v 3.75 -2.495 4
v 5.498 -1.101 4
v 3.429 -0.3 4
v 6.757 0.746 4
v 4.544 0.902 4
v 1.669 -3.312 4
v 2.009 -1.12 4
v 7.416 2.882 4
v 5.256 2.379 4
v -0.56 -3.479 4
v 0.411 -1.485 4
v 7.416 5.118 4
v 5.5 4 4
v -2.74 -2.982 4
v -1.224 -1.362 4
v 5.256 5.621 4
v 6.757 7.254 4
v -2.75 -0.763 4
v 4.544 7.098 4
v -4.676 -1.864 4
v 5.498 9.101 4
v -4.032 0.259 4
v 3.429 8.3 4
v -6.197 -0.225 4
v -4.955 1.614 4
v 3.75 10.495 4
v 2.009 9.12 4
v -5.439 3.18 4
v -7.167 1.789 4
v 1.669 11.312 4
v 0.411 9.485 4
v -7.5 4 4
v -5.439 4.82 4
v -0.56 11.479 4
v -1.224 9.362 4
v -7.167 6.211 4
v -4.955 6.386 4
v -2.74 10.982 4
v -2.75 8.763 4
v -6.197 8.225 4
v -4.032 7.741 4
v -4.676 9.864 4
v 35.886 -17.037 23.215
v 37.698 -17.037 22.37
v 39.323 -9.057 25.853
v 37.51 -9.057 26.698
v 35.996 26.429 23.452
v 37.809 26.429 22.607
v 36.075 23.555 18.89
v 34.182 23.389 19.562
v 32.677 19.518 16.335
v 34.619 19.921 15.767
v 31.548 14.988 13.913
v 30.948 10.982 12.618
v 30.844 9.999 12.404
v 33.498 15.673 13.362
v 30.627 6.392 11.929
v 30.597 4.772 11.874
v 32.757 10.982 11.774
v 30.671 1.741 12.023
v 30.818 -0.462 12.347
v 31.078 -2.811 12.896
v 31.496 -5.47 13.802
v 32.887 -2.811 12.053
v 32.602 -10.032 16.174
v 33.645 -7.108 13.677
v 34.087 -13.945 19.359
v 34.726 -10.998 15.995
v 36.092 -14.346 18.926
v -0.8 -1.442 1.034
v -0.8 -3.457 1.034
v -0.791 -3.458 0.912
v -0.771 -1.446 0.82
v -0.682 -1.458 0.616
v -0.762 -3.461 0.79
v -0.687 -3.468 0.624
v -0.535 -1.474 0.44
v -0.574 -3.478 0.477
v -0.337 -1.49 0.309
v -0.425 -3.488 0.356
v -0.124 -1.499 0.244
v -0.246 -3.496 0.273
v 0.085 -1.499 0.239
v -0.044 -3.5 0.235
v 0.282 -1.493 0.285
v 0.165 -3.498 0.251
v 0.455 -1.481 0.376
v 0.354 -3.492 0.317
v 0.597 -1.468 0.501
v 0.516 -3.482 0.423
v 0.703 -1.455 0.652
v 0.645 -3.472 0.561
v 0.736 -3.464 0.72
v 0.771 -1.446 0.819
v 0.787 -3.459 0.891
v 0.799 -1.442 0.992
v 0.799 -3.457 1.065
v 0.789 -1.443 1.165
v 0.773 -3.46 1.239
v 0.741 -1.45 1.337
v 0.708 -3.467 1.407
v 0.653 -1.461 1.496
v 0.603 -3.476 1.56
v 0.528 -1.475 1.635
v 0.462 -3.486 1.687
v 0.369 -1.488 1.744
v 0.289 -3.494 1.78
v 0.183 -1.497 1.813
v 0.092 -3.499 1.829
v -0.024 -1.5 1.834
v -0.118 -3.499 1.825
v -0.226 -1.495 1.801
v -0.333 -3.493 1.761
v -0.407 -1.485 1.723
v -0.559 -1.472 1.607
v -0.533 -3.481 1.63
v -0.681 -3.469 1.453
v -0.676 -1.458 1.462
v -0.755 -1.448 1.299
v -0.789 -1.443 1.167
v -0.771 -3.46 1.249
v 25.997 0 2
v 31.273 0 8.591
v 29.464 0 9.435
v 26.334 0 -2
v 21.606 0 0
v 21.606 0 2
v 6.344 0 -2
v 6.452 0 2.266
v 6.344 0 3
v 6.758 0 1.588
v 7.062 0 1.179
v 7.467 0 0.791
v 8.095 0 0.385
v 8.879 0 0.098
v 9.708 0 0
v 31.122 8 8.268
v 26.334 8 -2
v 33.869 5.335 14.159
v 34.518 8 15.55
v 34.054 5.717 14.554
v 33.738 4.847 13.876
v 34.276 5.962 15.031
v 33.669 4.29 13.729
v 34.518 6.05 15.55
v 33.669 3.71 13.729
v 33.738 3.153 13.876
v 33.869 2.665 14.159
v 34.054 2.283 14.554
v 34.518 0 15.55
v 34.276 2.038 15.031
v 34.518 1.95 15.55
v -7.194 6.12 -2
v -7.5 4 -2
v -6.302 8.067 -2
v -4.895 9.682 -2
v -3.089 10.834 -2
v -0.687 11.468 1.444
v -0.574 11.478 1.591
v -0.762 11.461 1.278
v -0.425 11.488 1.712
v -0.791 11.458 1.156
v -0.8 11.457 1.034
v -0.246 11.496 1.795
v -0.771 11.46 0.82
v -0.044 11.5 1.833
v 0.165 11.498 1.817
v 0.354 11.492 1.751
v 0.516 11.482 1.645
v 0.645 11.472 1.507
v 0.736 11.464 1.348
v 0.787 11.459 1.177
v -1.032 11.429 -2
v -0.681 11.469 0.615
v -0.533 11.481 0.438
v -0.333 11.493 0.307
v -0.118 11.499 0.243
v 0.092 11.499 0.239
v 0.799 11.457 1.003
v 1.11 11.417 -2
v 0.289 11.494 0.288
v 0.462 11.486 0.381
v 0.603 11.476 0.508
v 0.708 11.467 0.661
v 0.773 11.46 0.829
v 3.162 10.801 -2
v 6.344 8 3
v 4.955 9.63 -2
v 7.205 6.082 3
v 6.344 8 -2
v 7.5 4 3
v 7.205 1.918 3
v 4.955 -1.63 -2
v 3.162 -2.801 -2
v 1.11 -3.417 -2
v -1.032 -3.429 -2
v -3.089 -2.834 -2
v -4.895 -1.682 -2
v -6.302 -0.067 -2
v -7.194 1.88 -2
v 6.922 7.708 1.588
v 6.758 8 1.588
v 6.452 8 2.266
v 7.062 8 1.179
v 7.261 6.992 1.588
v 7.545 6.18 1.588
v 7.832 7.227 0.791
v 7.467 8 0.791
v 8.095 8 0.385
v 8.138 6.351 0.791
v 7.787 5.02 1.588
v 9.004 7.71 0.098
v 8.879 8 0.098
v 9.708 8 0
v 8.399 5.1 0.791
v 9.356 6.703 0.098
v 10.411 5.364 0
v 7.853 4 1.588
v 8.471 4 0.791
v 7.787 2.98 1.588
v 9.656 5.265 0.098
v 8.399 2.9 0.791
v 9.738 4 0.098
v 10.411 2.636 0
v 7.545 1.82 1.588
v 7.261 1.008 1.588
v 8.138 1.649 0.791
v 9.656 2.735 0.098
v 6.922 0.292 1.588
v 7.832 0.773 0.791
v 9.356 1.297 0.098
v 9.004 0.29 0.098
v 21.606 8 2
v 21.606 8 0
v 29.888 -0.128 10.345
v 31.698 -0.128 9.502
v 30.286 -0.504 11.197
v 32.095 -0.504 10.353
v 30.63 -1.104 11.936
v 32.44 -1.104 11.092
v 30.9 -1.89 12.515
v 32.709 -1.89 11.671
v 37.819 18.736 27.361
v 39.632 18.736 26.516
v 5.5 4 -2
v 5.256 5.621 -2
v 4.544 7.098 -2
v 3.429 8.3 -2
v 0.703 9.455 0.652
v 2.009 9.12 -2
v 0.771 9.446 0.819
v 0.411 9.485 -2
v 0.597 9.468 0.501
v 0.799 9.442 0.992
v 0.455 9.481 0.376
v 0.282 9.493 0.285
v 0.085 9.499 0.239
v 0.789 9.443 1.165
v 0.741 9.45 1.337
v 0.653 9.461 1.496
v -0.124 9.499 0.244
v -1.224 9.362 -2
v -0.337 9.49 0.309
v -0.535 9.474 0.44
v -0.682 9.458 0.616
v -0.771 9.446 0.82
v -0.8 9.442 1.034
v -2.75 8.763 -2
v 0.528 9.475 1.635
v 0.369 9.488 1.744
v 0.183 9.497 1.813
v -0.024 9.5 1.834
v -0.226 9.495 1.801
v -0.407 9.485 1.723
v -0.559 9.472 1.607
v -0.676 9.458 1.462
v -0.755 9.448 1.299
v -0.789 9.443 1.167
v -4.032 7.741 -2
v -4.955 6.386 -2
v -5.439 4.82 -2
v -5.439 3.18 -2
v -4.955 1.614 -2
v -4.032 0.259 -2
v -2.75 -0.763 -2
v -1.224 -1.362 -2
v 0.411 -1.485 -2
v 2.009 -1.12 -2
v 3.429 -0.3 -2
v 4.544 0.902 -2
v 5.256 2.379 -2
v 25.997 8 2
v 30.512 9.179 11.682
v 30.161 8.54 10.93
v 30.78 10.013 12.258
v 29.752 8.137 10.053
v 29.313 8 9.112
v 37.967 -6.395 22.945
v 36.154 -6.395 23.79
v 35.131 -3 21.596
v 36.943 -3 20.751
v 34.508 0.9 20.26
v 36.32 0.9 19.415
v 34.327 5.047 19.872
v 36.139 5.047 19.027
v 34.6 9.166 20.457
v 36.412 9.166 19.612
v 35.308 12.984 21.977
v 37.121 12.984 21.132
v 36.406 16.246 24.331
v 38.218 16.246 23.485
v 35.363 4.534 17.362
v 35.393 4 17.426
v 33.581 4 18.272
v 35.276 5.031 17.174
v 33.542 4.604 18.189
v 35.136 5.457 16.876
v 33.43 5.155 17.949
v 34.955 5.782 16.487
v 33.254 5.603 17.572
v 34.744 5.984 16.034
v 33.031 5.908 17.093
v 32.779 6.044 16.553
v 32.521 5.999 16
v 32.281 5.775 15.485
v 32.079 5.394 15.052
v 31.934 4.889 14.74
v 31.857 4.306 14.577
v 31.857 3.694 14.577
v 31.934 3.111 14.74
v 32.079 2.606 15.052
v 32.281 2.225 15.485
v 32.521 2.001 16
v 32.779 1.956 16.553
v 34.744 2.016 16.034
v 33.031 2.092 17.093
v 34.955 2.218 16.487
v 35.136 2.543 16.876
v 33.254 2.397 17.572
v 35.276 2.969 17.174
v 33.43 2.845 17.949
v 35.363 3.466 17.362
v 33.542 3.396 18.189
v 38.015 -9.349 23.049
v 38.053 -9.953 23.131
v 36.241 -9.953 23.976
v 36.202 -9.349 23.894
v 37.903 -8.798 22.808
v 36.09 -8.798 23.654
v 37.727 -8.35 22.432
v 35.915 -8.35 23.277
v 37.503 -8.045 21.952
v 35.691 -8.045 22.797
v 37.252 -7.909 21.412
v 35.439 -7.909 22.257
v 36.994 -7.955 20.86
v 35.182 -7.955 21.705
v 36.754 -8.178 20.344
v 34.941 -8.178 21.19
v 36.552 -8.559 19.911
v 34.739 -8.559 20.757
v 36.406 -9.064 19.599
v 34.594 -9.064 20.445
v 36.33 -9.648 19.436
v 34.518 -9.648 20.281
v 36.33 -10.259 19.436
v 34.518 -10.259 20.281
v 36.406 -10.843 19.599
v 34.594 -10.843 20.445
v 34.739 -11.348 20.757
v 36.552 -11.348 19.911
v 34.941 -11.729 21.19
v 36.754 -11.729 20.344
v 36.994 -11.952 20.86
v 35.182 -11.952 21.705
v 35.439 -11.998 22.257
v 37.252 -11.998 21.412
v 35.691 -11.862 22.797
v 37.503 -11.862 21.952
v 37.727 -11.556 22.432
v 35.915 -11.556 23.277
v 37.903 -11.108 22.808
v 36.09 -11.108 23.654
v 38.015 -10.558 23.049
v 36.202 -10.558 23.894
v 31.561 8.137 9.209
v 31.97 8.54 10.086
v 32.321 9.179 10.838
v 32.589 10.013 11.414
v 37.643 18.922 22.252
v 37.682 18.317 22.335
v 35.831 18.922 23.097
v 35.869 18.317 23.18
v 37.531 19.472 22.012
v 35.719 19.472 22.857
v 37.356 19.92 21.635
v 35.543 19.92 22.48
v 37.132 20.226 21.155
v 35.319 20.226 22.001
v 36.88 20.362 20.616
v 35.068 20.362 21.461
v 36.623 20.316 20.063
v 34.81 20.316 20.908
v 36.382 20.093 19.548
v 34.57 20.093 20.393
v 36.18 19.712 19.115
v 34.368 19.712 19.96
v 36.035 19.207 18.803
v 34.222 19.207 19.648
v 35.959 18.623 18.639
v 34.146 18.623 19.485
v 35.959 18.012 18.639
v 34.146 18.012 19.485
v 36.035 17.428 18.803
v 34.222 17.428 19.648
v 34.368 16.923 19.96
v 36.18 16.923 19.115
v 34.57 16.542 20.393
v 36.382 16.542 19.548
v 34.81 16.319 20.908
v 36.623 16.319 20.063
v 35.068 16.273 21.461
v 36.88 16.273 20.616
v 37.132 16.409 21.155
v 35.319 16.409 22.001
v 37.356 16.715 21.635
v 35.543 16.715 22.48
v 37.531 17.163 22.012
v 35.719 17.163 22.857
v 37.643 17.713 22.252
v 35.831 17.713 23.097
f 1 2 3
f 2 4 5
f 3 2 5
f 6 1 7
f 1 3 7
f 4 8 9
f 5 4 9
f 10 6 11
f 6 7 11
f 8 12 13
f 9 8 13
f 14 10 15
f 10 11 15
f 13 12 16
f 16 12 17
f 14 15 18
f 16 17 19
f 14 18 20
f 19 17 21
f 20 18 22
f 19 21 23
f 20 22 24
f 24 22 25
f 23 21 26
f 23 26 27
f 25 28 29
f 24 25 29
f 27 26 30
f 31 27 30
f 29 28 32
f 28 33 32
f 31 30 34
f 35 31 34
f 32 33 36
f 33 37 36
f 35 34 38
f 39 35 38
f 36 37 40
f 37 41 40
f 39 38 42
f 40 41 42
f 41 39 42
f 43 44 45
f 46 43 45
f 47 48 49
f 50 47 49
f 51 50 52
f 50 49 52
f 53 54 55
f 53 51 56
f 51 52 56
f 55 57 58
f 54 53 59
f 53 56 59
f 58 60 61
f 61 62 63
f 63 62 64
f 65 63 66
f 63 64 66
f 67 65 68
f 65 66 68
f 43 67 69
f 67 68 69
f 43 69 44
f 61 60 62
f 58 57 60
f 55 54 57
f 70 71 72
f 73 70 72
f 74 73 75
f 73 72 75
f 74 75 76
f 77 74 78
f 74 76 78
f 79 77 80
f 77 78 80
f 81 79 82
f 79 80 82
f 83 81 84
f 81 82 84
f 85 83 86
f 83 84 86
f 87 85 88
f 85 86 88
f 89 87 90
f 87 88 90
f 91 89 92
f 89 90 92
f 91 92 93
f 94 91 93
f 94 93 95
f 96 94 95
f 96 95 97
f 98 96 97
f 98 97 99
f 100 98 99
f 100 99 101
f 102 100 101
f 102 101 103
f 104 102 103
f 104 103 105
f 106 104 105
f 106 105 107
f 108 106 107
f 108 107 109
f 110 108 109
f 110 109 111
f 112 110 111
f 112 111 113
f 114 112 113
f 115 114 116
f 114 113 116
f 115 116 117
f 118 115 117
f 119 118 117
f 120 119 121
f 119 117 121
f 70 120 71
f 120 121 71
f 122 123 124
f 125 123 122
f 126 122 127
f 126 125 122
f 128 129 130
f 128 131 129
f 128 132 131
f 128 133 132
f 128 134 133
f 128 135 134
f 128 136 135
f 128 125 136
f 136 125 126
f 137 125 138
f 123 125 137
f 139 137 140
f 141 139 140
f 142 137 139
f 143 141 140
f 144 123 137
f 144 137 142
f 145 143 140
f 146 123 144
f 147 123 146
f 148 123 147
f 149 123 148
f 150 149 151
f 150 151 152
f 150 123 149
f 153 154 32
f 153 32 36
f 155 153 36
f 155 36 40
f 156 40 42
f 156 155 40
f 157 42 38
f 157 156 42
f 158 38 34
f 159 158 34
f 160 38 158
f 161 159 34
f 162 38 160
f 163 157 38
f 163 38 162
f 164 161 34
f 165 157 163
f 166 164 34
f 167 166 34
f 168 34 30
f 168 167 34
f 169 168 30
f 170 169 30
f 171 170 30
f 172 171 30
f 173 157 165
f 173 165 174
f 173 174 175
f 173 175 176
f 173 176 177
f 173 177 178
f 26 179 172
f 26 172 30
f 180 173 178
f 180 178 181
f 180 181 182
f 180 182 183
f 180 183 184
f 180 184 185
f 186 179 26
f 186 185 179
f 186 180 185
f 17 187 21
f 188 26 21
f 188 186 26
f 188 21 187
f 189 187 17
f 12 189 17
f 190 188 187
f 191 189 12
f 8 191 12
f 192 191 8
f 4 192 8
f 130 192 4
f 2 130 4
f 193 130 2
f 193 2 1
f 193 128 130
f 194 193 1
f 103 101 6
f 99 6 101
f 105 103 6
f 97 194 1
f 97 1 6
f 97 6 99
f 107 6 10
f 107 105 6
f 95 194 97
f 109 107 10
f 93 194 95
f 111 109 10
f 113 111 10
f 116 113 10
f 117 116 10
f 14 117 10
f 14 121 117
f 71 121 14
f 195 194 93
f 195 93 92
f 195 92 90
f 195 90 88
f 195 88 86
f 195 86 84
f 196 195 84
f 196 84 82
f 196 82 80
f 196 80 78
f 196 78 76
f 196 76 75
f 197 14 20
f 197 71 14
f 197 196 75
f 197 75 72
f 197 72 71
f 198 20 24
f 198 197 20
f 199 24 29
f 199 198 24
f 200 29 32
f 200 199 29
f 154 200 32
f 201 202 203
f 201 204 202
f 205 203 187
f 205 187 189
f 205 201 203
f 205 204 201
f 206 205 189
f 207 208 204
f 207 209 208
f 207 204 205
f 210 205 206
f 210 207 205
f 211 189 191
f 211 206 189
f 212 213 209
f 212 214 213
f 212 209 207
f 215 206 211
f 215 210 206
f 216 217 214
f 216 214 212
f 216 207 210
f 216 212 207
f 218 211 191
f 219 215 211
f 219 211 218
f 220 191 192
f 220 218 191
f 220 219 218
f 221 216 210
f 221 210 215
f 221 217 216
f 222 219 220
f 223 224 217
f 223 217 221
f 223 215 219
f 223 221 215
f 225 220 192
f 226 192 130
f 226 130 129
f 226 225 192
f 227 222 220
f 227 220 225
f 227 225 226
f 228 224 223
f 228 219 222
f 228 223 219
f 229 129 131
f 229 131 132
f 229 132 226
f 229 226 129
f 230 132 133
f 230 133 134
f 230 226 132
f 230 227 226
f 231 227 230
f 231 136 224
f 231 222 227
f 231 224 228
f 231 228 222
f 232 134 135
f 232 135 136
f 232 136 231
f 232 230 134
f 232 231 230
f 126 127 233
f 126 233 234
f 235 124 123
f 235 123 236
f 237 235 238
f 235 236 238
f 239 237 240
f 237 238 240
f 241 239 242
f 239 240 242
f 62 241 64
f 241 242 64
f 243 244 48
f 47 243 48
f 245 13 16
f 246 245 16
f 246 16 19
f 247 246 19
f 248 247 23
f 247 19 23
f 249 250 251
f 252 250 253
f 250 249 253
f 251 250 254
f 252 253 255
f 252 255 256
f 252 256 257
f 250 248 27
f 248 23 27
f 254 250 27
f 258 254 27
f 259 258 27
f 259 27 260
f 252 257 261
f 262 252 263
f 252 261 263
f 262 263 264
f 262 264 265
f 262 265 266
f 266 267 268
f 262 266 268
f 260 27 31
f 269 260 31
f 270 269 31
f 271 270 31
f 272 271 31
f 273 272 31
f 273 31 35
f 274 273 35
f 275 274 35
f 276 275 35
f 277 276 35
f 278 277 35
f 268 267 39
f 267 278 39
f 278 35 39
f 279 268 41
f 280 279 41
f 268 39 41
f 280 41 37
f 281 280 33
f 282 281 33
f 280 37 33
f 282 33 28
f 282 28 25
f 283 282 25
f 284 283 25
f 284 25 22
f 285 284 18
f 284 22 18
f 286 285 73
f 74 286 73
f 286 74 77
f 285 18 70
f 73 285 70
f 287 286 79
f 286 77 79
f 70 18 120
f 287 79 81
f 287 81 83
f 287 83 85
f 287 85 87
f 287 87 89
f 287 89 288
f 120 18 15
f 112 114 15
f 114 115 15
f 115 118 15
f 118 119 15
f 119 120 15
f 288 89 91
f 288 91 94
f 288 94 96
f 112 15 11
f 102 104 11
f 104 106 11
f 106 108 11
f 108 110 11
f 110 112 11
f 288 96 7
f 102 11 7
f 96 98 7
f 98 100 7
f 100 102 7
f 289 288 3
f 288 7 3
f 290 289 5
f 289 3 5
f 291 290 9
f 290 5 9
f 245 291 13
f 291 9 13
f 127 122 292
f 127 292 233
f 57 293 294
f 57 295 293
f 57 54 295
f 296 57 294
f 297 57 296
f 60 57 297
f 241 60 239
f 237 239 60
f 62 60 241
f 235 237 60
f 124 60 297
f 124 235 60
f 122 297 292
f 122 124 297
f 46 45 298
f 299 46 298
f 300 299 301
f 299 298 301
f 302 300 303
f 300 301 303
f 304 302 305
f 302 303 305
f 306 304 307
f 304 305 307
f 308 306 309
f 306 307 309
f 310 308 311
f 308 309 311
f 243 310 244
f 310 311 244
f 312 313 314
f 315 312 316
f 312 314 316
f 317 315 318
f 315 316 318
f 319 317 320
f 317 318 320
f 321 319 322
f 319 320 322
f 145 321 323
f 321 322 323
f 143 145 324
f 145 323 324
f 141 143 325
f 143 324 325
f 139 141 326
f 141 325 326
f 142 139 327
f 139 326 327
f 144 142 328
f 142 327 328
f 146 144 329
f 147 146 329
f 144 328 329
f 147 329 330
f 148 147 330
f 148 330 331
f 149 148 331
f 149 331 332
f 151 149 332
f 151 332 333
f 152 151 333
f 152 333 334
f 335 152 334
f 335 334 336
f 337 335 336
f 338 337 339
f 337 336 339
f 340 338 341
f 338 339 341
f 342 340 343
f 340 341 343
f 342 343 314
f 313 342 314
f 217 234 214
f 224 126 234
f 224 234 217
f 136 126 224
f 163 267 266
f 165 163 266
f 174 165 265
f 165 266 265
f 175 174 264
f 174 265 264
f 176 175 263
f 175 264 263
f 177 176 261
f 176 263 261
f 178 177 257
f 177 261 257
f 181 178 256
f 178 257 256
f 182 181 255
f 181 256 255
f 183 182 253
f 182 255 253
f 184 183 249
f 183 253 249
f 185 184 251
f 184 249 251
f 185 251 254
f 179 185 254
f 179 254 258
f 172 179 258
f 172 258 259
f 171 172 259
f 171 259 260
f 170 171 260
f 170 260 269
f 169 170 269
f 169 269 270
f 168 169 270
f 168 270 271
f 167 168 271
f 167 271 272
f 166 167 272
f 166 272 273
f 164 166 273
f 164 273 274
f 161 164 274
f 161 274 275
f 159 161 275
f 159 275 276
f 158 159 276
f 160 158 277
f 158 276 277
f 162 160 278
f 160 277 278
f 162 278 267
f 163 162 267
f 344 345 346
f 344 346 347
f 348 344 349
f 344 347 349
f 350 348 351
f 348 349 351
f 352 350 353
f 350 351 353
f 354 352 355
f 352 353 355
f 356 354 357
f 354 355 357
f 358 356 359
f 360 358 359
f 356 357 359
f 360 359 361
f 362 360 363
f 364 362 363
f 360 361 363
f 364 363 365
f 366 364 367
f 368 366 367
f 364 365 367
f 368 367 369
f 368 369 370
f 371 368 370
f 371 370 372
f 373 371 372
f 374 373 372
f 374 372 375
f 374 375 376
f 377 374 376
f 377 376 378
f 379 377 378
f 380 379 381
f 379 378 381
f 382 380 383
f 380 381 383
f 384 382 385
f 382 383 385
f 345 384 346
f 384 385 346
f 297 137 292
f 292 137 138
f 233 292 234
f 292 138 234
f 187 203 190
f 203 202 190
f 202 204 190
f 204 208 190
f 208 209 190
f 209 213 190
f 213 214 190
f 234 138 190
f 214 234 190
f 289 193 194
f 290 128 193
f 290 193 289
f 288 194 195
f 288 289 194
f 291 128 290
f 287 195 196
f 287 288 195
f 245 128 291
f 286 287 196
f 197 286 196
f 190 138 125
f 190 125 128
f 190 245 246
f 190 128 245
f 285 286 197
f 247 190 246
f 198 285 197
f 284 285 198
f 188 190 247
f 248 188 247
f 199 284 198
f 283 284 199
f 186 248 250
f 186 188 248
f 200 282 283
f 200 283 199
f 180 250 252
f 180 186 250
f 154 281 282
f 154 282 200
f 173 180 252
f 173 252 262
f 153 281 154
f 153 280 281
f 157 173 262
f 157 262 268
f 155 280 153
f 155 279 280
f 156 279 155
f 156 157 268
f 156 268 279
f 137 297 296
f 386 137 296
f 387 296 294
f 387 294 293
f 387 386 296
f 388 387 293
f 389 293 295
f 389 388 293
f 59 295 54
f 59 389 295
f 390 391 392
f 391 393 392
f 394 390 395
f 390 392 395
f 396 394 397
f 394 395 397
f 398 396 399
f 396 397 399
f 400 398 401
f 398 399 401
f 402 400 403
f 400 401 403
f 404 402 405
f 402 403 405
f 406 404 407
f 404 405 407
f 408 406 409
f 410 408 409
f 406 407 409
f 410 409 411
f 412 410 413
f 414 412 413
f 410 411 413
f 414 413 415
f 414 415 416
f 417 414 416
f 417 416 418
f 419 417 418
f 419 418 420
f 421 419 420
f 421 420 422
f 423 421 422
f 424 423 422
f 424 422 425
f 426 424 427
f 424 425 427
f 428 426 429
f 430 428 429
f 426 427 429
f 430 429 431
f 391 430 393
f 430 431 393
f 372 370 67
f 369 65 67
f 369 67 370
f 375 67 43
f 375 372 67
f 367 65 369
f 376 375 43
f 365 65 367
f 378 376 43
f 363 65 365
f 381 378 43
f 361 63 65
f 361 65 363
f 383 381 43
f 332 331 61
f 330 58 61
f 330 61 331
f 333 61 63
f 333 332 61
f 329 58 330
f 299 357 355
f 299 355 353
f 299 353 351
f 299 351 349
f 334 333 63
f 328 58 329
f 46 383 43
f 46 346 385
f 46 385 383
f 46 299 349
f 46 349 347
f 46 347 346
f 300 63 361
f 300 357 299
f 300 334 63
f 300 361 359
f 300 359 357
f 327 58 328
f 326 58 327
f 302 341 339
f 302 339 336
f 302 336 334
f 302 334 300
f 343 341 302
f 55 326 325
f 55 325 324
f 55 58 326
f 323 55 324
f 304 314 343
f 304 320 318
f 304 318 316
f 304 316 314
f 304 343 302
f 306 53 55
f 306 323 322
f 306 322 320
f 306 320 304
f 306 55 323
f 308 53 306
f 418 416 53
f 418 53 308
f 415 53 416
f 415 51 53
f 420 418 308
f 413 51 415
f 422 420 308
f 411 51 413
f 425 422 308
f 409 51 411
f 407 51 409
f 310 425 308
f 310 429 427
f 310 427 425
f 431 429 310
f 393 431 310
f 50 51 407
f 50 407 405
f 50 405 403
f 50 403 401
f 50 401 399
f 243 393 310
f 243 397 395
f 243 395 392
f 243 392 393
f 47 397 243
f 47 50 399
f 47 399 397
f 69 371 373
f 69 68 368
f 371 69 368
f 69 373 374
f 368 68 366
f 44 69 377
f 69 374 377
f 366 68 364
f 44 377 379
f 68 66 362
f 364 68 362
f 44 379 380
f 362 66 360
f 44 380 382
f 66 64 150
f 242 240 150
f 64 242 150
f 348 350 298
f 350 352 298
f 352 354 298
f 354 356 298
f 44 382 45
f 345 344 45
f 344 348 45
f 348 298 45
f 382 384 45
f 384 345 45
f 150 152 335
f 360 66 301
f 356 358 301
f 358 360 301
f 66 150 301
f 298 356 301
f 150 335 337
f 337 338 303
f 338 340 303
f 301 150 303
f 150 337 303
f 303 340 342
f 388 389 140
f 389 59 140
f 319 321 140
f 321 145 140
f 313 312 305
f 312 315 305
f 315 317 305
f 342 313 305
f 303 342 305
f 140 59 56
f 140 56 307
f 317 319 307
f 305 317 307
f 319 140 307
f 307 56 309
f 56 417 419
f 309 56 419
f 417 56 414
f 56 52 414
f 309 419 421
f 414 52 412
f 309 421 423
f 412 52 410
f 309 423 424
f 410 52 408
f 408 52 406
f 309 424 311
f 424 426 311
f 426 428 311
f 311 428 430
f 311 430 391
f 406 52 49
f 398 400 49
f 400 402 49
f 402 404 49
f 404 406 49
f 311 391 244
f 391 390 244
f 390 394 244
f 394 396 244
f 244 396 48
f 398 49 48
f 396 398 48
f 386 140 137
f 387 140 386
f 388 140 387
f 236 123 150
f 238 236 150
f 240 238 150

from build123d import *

# Parameters (mm, degrees)
BOSS_EXTRUDE1_DEPTH     = 8
BOSS_EXTRUDE2_DEPTH     = 2
SKETCH3_R               = 2.05
CUT_EXTRUDE3_DEPTH      = 10
CUT_EXTRUDE3_DEPTH_BACK = 10
FILLET2_R               = 4
SKETCH6_R               = 7.5
BOSS_EXTRUDE3_DEPTH     = 6
SKETCH2_R               = 5.5
CUT_EXTRUDE4_DEPTH      = 28.361360249
CUT_EXTRUDE4_DEPTH_BACK = 3
SKETCH8_R               = 0.8
CUT_EXTRUDE5_DEPTH      = 30.928860828
FILLET3_R               = 3


with BuildPart() as part:
    # Sketch1 → Boss-Extrude1 (new body)
    with BuildSketch(Plane(origin=(0, 0, 0), x_dir=(1, 0, 0), z_dir=(0, 1, 0))):
        Polygon((0, 0), (0, 2), (26.334414729, 2), (34.518104392, -15.549979118), (32.760161227, -16.503727422), (25.996962058, -2), (21.605779457, -2), (21.605779457, 0), align=None)
    extrude(amount=BOSS_EXTRUDE1_DEPTH)

    # Sketch5 → Boss-Extrude2 (add)
    with BuildSketch(Plane(origin=(22.396969556, 0, -10.443878423), x_dir=(-0.422618262, 0, -0.906307787), z_dir=(0.906307787, 0, -0.422618262))):
        with BuildLine():
            Line((-40.780850255, 18.736062391), (-36.467218683, 26.428860828))
            ThreePointArc((-36.467218683, 26.428860828), (-23.692308478, 4.771999965), (-36.205658542, -17.037035395))
            Line((-36.205658542, -17.037035395), (-40.049339329, -9.057253488))
            ThreePointArc((-40.049339329, -9.057253488), (-32.517126315, 5.047276383), (-40.780850255, 18.736062391))
        make_face()
    extrude(amount=-BOSS_EXTRUDE2_DEPTH)

    # Sketch3 → Cut-Extrude3 (cut, two sides)
    with BuildSketch(Plane(origin=(20.587699136, 0, -9.600201771), x_dir=(0.422618262, 0, 0.906307787), z_dir=(-0.906307787, 0, 0.422618262))) as cut_extrude3_sk:
        with Locations((28.701516689, 4)):
            Circle(SKETCH3_R)
        with Locations((34.117040182, 18.317355913)):
            Circle(SKETCH3_R)
        with Locations((48.070293023, 24.611901983)):
            Circle(SKETCH3_R)
        with Locations((62.387648936, 19.19637849)):
            Circle(SKETCH3_R)
        with Locations((68.682195005, 5.243125649)):
            Circle(SKETCH3_R)
        with Locations((63.266671512, -9.074230264)):
            Circle(SKETCH3_R)
        with Locations((49.313418672, -15.368776333)):
            Circle(SKETCH3_R)
        with Locations((34.996062759, -9.953252841)):
            Circle(SKETCH3_R)
    extrude(amount=CUT_EXTRUDE3_DEPTH, mode=Mode.SUBTRACT)
    extrude(cut_extrude3_sk.sketch, amount=-CUT_EXTRUDE3_DEPTH_BACK, mode=Mode.SUBTRACT)

    # Fillet2
    fillet2_edges = [part.edges().sort_by_distance(p)[0] for p in [
        (31.687047343, 0, 11.840592477),
        (31.60186373, 8, 11.657915631),
    ]]
    fillet(fillet2_edges, radius=FILLET2_R)

    # Sketch6 → Boss-Extrude3 (add)
    with BuildSketch(Plane(origin=(0, 0, -2), x_dir=(-1, 0, 0), z_dir=(0, 0, -1))):
        with Locations((0, 4)):
            Circle(SKETCH6_R)
    extrude(amount=-BOSS_EXTRUDE3_DEPTH)

    # Sketch2 → Cut-Extrude4 (cut, two sides)
    with BuildSketch(Plane.XY) as cut_extrude4_sk:
        with Locations((0, 4)):
            Circle(SKETCH2_R)
    extrude(amount=CUT_EXTRUDE4_DEPTH, mode=Mode.SUBTRACT)
    extrude(cut_extrude4_sk.sketch, amount=-CUT_EXTRUDE4_DEPTH_BACK, mode=Mode.SUBTRACT)

    # Sketch8 → Cut-Extrude5 (cut, through all)
    with BuildSketch(Plane(origin=(0, -3.5, 0), x_dir=(-1, 0, 0), z_dir=(0, -1, 0))):
        with Locations((0, -1.034043254)):
            Circle(SKETCH8_R)
    extrude(amount=-CUT_EXTRUDE5_DEPTH, mode=Mode.SUBTRACT)

    # Fillet3
    fillet3_edges = [part.edges().sort_by_distance(p)[0] for p in [
        (7.5, 4, 0),
    ]]
    fillet(fillet3_edges, radius=FILLET3_R)


solid = part.part
